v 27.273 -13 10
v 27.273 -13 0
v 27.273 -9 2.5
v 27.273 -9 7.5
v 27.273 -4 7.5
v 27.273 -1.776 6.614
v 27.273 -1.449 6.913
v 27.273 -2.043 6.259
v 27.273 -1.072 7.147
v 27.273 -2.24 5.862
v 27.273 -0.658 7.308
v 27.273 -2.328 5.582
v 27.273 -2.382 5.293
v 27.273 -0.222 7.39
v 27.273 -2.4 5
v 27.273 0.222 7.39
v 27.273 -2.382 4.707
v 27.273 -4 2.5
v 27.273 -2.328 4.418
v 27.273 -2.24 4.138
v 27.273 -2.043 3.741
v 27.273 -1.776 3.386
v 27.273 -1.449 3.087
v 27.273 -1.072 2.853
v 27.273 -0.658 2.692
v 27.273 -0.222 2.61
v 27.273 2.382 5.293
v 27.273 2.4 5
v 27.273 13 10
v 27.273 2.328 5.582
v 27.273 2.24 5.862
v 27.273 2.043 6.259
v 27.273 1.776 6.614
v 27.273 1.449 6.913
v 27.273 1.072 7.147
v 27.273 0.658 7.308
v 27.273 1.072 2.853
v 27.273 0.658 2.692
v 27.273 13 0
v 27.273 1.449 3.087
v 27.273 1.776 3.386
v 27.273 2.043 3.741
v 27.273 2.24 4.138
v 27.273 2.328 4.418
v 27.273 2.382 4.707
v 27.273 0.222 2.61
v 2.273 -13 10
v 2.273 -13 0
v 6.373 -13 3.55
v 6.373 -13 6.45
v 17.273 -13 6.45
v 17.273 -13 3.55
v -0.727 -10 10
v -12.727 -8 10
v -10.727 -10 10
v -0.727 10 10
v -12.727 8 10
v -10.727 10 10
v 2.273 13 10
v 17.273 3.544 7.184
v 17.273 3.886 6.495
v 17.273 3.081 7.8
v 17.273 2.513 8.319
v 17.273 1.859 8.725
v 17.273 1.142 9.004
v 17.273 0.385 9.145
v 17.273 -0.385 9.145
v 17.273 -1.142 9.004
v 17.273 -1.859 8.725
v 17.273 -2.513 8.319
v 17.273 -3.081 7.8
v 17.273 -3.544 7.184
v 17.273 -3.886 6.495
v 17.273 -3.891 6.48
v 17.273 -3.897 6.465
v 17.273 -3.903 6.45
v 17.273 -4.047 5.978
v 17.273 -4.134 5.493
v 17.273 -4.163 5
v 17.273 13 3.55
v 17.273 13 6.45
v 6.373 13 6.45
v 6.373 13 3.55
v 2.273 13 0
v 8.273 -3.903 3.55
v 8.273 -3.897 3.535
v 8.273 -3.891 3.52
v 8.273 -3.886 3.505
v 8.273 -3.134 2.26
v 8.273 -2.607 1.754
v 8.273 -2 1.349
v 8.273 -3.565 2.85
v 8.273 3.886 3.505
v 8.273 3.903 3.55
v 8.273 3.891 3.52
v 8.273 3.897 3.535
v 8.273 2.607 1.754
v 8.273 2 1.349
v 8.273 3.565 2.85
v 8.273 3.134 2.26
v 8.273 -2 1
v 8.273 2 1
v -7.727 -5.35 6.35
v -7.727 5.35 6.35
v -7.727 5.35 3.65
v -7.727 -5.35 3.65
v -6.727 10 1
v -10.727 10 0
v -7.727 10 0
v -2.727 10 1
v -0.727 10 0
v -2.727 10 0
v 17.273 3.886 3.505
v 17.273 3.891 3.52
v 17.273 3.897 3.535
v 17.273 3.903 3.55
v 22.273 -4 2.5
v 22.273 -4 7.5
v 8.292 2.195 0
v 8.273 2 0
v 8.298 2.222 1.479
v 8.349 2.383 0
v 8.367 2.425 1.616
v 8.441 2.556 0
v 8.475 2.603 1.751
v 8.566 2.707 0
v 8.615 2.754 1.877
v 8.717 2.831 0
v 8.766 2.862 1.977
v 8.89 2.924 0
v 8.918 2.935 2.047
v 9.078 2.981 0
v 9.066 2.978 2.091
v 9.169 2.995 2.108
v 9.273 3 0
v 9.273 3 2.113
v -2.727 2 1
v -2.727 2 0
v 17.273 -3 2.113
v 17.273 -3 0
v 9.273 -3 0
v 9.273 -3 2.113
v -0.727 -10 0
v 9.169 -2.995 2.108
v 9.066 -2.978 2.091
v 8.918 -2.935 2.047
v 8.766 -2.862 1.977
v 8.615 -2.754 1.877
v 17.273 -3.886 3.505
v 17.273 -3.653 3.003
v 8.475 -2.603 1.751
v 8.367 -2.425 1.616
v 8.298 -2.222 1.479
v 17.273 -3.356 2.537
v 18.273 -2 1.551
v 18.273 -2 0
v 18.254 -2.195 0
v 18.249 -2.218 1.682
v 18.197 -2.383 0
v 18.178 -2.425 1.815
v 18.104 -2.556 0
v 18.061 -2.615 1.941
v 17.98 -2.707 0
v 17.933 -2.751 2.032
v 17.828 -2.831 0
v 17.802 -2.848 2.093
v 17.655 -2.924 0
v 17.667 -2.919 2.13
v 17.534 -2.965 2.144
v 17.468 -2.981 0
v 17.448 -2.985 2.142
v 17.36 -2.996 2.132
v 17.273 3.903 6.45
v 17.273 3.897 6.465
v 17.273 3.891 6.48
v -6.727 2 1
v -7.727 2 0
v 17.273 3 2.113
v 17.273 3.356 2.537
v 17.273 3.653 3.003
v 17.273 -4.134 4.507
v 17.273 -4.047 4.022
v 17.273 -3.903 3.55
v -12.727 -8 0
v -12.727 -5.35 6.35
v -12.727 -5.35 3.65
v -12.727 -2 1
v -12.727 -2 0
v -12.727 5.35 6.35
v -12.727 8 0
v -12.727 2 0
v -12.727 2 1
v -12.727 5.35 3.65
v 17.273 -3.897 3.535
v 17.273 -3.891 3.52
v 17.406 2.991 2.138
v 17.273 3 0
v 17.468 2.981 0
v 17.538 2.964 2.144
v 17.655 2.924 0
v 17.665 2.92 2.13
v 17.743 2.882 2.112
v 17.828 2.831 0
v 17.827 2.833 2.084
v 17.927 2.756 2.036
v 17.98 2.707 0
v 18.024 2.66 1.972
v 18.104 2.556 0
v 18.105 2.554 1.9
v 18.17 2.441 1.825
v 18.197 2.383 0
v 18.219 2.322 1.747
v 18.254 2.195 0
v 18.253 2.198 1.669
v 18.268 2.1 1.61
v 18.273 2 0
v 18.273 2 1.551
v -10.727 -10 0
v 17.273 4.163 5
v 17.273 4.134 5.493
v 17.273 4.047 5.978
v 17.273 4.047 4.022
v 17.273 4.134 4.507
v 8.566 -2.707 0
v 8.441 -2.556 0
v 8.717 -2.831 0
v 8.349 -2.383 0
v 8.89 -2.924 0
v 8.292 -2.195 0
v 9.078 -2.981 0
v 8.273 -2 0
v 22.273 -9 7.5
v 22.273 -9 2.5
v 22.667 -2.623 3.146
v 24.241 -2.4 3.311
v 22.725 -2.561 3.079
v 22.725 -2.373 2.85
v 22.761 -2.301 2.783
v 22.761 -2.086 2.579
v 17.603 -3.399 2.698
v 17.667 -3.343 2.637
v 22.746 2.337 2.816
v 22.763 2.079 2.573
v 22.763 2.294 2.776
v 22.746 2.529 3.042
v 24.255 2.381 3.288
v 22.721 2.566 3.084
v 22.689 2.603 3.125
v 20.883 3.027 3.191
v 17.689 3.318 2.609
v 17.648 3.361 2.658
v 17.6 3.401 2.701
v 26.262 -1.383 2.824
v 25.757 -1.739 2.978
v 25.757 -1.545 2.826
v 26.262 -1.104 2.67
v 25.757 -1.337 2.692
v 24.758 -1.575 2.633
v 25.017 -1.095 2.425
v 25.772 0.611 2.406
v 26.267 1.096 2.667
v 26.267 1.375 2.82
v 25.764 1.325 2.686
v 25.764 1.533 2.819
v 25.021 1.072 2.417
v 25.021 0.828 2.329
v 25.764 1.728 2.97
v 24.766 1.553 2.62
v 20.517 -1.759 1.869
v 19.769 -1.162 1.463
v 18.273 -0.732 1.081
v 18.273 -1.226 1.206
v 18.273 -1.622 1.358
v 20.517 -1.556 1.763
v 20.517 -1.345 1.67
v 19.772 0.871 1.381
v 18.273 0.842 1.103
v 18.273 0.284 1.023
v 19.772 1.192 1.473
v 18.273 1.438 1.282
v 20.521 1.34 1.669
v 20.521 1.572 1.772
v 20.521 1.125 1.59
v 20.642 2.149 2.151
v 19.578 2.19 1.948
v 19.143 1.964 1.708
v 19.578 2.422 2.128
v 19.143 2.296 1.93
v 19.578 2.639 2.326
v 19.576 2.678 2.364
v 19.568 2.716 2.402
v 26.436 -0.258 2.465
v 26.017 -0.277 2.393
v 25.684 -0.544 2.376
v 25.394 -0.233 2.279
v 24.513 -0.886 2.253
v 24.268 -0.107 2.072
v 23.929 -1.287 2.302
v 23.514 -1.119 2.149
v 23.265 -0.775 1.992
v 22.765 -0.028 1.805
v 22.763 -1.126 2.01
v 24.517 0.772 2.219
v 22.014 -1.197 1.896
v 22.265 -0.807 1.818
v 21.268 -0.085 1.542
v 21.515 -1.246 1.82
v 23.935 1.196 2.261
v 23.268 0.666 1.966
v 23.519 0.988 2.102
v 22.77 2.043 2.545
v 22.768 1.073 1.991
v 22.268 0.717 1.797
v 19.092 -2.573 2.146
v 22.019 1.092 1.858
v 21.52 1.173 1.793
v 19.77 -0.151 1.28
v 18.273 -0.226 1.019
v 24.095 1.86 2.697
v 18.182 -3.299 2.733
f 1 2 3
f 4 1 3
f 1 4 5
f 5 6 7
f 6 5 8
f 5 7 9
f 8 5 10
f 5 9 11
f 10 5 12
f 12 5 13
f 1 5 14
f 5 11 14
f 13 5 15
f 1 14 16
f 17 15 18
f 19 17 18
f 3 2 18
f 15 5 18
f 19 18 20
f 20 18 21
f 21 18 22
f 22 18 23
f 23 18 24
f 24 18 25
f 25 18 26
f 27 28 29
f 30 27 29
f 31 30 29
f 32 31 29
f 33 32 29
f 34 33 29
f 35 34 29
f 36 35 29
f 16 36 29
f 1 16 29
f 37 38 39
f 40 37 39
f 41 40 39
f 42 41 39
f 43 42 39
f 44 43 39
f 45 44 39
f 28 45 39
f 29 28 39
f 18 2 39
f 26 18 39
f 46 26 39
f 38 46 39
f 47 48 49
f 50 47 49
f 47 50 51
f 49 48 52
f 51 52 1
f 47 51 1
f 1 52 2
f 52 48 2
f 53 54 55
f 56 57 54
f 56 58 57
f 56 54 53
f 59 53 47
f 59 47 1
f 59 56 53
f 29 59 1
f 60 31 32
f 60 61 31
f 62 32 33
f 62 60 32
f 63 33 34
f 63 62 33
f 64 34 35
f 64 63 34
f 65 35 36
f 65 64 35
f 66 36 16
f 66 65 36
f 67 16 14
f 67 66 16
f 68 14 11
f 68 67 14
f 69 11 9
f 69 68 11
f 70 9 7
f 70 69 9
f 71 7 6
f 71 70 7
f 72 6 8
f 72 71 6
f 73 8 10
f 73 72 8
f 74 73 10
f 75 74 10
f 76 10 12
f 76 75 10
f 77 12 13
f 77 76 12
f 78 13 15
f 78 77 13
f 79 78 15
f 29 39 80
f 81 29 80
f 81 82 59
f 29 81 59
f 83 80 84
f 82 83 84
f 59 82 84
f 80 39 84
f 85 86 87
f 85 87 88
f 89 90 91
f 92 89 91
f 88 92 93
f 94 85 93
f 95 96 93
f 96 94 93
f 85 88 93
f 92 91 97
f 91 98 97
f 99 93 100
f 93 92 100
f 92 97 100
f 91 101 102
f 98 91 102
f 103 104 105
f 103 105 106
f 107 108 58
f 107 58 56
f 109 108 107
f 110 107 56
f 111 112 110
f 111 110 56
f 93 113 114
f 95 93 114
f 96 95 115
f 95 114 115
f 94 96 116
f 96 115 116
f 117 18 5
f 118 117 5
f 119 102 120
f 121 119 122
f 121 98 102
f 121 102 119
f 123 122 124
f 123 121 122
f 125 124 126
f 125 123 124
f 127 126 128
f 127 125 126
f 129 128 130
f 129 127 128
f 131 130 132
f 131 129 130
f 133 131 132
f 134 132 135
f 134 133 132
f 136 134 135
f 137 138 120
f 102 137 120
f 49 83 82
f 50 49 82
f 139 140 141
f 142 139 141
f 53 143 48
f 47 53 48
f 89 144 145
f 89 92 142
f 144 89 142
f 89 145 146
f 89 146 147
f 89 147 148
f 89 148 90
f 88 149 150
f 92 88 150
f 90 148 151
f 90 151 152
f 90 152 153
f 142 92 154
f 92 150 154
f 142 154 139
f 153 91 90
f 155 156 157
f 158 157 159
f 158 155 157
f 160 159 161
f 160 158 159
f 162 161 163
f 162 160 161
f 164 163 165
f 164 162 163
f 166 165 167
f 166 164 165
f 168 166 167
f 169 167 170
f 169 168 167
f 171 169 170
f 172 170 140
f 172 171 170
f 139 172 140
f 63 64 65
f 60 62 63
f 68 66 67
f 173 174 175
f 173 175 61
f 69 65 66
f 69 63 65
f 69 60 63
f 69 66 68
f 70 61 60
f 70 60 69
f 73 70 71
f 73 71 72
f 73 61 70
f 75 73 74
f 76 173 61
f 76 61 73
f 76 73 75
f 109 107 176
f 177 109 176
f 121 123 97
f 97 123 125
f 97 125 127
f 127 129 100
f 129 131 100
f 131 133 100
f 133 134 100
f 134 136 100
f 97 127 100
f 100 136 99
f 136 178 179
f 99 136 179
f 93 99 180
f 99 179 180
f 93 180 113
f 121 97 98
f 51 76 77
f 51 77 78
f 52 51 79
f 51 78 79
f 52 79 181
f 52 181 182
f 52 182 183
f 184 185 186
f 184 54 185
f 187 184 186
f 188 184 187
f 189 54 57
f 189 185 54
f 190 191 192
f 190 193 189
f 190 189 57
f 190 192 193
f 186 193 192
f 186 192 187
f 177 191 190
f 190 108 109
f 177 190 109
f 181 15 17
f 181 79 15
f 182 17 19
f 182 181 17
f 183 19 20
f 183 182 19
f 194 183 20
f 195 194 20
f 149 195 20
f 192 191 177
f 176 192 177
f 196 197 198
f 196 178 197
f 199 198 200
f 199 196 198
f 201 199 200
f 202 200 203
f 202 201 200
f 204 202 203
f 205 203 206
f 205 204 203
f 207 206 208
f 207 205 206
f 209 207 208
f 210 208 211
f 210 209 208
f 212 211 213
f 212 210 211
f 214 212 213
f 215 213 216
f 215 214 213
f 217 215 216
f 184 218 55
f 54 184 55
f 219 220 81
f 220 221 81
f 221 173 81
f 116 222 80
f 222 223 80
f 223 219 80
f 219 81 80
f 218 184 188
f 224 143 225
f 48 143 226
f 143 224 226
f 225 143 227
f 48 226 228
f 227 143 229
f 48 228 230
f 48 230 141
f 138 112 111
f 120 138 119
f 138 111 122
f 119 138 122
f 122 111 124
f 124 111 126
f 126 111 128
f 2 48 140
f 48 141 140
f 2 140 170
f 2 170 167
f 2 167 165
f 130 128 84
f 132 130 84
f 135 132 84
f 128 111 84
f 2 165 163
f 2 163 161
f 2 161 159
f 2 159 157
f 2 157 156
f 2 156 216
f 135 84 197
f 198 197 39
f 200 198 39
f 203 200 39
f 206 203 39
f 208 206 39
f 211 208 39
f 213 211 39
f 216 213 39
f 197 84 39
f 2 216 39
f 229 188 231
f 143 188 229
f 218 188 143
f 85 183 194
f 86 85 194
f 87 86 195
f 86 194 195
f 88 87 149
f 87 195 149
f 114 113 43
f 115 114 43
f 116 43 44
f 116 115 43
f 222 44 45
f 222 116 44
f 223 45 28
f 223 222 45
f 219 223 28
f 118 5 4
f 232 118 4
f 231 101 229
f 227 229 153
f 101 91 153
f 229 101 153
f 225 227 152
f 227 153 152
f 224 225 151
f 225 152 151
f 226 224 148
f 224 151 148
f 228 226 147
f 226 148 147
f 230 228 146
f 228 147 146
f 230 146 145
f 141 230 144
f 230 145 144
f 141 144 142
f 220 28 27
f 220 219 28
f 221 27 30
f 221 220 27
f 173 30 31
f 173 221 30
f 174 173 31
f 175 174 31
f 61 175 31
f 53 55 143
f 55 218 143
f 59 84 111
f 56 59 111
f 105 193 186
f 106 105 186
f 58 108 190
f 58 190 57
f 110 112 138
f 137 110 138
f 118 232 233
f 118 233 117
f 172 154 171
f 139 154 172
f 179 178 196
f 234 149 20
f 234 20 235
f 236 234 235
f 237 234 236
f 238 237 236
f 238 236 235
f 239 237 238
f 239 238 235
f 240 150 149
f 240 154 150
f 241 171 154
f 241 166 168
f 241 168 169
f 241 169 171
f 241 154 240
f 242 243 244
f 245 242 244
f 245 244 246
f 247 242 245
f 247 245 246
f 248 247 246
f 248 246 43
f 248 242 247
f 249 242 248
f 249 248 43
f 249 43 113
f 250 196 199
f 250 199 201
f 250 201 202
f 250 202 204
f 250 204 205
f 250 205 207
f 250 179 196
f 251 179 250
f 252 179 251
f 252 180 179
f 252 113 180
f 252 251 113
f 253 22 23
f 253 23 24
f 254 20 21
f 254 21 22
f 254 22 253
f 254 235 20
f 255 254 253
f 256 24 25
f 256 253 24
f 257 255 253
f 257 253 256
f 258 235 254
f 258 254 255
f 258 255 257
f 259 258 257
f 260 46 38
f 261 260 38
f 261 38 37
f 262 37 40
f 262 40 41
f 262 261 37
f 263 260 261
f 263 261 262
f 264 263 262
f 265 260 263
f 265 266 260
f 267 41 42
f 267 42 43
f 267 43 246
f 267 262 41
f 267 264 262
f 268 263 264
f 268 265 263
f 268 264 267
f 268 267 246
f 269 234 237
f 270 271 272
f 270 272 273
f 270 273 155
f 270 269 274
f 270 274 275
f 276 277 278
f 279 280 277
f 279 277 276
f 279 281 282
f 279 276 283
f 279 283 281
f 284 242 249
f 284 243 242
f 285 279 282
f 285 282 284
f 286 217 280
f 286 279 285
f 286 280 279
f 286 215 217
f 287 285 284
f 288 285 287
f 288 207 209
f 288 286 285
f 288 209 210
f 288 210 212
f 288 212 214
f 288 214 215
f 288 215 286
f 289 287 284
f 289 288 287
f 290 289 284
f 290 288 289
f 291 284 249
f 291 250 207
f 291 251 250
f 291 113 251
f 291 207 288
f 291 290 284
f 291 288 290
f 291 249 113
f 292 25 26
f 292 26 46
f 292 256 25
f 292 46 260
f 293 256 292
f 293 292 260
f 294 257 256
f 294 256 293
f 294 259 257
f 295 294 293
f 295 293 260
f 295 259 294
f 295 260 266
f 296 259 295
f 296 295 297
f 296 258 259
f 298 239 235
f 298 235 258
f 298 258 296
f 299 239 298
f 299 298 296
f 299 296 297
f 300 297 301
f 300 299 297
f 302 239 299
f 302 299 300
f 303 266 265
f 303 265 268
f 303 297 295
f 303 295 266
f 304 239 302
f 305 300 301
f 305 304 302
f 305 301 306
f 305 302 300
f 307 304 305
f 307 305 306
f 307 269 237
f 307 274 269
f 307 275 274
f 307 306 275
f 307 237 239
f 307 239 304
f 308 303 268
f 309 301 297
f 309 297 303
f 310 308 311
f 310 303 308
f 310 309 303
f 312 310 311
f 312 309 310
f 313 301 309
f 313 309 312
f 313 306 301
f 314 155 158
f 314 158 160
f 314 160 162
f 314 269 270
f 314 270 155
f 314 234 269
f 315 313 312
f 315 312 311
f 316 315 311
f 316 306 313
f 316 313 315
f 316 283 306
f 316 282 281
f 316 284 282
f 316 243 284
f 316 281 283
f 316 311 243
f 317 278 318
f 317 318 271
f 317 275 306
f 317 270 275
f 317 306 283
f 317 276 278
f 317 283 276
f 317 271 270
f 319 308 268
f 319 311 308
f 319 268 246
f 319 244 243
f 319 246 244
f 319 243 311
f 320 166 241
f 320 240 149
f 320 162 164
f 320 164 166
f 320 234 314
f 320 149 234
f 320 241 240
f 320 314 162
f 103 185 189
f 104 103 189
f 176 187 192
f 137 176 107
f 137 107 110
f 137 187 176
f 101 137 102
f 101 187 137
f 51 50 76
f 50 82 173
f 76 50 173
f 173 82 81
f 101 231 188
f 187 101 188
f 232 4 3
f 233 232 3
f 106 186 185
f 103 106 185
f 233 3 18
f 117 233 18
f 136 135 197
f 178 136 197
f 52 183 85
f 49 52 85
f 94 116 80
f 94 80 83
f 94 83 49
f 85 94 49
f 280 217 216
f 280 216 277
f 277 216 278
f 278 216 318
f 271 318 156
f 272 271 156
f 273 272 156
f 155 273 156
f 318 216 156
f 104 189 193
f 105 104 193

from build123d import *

# Parameters (mm, degrees)
F0_W        = 10
F0_H        = 20
F1_DEPTH    = 10
F3_DEPTH    = 5
F4_T4_DEPTH = 35.7168298797
F4_T9_DEPTH = 35.7168298797
F5_SIZE     = 2
F7_DEPTH    = 26
F9_DEPTH    = 10
F9_TAPER    = -10
F11_DEPTH   = 5
F12_DEPTH   = 9
F13_R       = 1
F14_W       = 4
F14_H       = 8
F15_DEPTH   = 1
F16_SIZE    = 0.99999
F17_DEPTH   = 5


# Not quite as in the source:
# - a fillet or chamfer that OpenCascade refuses, or shapes differently, is made with other operations: its cross-section is extruded or revolved along the edge and cut away or added
# - a fillet or chamfer is up to 0.001 mm smaller than in the source, because OpenCascade refuses the exact size
# - a feature names something its author has since deleted; it is built from what else it names


with BuildPart() as f1:
    # F0 (on Top) → F1 (new body)
    with BuildSketch(Plane.XY):
        with Locations((-7.7272727273, 0)):
            Rectangle(F0_W, F0_H)
        Polygon((-2.7272727273, 13), (-2.7272727273, 10), (-2.7272727273, -10), (-2.7272727273, -13), (27.2727272727, -13), (27.2727272727, 13), align=None)
    extrude(amount=F1_DEPTH)

    # F2 (on face) → F3 (cut)
    with BuildSketch(Plane(origin=(-12.7272727273, 0, 0), x_dir=(0, -1, 0), z_dir=(-1, 0, 0))):
        Polygon((0, 5), (-2.7, 6.35), (-5.35, 6.35), (-5.35, 3.65), (-2.7, 3.65), align=None)
        Polygon((2.7, 3.65), (0, 5), (-2.7, 3.65), align=None)
        Polygon((2.7, 6.35), (0, 5), (2.7, 3.65), (5.35, 3.65), (5.35, 6.35), align=None)
        Polygon((2.7, 6.35), (-2.7, 6.35), (0, 5), align=None)
    extrude(amount=-F3_DEPTH, mode=Mode.SUBTRACT)

    # F4: chamfer of 5 on 2 edges, made by hand


with BuildPart() as f4_tool2:
    # F4_s3 → F4_t4 (new body)
    with BuildSketch(Plane.XY.offset(-12.8584149398)):
        Polygon((2.2727272727, 13), (-2.7272727273, 8), (-2.7272727273, 13), align=None)
    extrude(amount=F4_T4_DEPTH)

    split(bisect_by=Plane.XZ.offset(-10), keep=Keep.BOTTOM)


with BuildPart() as f1_1:
    add(f1.part)

    # F4_t1: cut F4_tool2
    add(f4_tool2.part, mode=Mode.SUBTRACT)


with BuildPart() as f4_tool7:
    # F4_s8 → F4_t9 (new body)
    with BuildSketch(Plane.XY.offset(-12.8584149398)):
        Polygon((-2.7272727273, -8), (2.2727272727, -13), (-2.7272727273, -13), align=None)
    extrude(amount=F4_T9_DEPTH)

    split(bisect_by=Plane.XZ.offset(10), keep=Keep.TOP)


with BuildPart() as f1_2:
    add(f1_1.part)

    # F4_t6: cut F4_tool7
    add(f4_tool7.part, mode=Mode.SUBTRACT)

    # F5
    f5_edges = [f1_2.edges().sort_by_distance(p)[0] for p in [
        (-12.727273, 10, 5),
        (-12.727273, -10, 5),
    ]]
    chamfer(f5_edges, length=F5_SIZE)

    # F6 (on face) → F7 (cut, through all)
    with BuildSketch(Plane(origin=(0, 13, 0), x_dir=(-1, 0, 0), z_dir=(0, 1, 0))):
        Polygon((-14.7727272727, 5), (-17.2727272727, 6), (-17.2727272727, 5), align=None)
        Polygon((-17.2727272727, 6.45), (-17.2727272727, 6), (-14.7727272727, 5), (-11.1477272727, 6.45), align=None)
        Polygon((-11.1477272727, 6.45), (-14.7727272727, 5), (-6.3727272727, 5), (-6.3727272727, 6.45), align=None)
        Polygon((-17.2727272727, 4), (-14.7727272727, 5), (-17.2727272727, 5), align=None)
        Polygon((-11.1477272727, 3.55), (-14.7727272727, 5), (-17.2727272727, 4), (-17.2727272727, 3.55), align=None)
        Polygon((-6.3727272727, 5), (-14.7727272727, 5), (-11.1477272727, 3.55), (-6.3727272727, 3.55), align=None)
    extrude(amount=-F7_DEPTH, mode=Mode.SUBTRACT)

    # F8 (on face) → F9 (cut, through all)
    with BuildSketch(Plane.YZ.offset(27.2727272727)):
        with BuildLine():
            Line((-2.4, 5), (0, 5))
            Line((0, 5), (-2.2400294549, 5.8615497903))
            ThreePointArc((-2.2400294549, 5.8615497903), (-2.3596684822, 5.4381377114), (-2.4, 5))
        make_face()
        with BuildLine():
            Line((-2.2400294549, 5.8615497903), (0, 5))
            Line((0, 5), (2.2400294549, 5.8615497903))
            ThreePointArc((2.2400294549, 5.8615497903), (0, 7.4), (-2.2400294549, 5.8615497903))
        make_face()
        with BuildLine():
            Line((0, 5), (2.2400294549, 4.1384502097))
            ThreePointArc((2.2400294549, 4.1384502097), (2.3596684822, 4.5618622886), (2.4, 5))
            ThreePointArc((2.4, 5), (2.3596684822, 5.4381377114), (2.2400294549, 5.8615497903))
            Line((2.2400294549, 5.8615497903), (0, 5))
        make_face()
        with BuildLine():
            ThreePointArc((-2.2400294549, 4.1384502097), (0, 2.6), (2.2400294549, 4.1384502097))
            Line((2.2400294549, 4.1384502097), (0, 5))
            Line((0, 5), (-2.2400294549, 4.1384502097))
        make_face()
        with BuildLine():
            Line((-2.2400294549, 4.1384502097), (0, 5))
            Line((0, 5), (-2.4, 5))
            ThreePointArc((-2.4, 5), (-2.3596684822, 4.5618622886), (-2.2400294549, 4.1384502097))
        make_face()
    extrude(amount=-F9_DEPTH, taper=F9_TAPER, mode=Mode.SUBTRACT)

    # F10 (on face) → F11 (cut)
    with BuildSketch(Plane(origin=(0, 0, 0), x_dir=(1, 0, 0), z_dir=(0, 0, -1))):
        Polygon((18.2727272727, -3), (18.2727272727, 3), (16.2727272727, 3), (8.2727272727, 3), (8.2727272727, -3), (16.2727272727, -3), align=None)
    extrude(amount=-F11_DEPTH, mode=Mode.SUBTRACT)

    # F12 (cut, through all): faces of the model
    f12_faces = [f1_2.faces().sort_by_distance(p)[0] for p in [
        (17.2727272727, 3.3247194786, 3.0369278497),
        (17.2727272727, -3.3247194786, 3.0369278497),
    ]]
    extrude(f12_faces, amount=-F12_DEPTH, mode=Mode.SUBTRACT)

    # F13
    f13_edges = [f1_2.edges().sort_by_distance(p)[0] for p in [
        (18.272727, -3, 1.187016),
        (8.272727, -3, 1.056669),
        (8.272727, 3, 1.056669),
        (18.272727, 3, 1.187016),
    ]]
    fillet(f13_edges, radius=F13_R)

    # F14 (on face) → F15 (cut)
    with BuildSketch(Plane(origin=(0, 0, 0), x_dir=(1, 0, 0), z_dir=(0, 0, -1))):
        Polygon((8.2727272727, 2), (-12.7272727273, 2), (-12.7272727273, -2), (-6.7272727273, -2), (-2.7272727273, -2), (8.2727272727, -2), align=None)
        with Locations((-4.7272727273, -6)):
            Rectangle(F14_W, F14_H)
    extrude(amount=-F15_DEPTH, mode=Mode.SUBTRACT)

    # F16 (size 1 in the source; OpenCascade refuses exactly that, so slightly less here)
    f16_edges = [f1_2.edges().sort_by_distance(p)[0] for p in [
        (-6.727273, 6, 0),
    ]]
    chamfer(f16_edges, length=F16_SIZE)

    # F8 (on face) → F17 (cut)
    with BuildSketch(Plane.YZ.offset(27.2727272727)):
        Polygon((-4, 7.5), (-6.5, 7.5), (-4, 6.5384615385), align=None)
        Polygon((-4, 6.5384615385), (-6.5, 7.5), (-9, 7.5), (-9, 5), (-4, 5), align=None)
        Polygon((-9, 2.5), (-6.5, 2.5), (-4, 3.4615384615), (-4, 5), (-9, 5), align=None)
        Polygon((-4, 3.4615384615), (-6.5, 2.5), (-4, 2.5), align=None)
    extrude(amount=-F17_DEPTH, mode=Mode.SUBTRACT)


solid = f1_2.part
